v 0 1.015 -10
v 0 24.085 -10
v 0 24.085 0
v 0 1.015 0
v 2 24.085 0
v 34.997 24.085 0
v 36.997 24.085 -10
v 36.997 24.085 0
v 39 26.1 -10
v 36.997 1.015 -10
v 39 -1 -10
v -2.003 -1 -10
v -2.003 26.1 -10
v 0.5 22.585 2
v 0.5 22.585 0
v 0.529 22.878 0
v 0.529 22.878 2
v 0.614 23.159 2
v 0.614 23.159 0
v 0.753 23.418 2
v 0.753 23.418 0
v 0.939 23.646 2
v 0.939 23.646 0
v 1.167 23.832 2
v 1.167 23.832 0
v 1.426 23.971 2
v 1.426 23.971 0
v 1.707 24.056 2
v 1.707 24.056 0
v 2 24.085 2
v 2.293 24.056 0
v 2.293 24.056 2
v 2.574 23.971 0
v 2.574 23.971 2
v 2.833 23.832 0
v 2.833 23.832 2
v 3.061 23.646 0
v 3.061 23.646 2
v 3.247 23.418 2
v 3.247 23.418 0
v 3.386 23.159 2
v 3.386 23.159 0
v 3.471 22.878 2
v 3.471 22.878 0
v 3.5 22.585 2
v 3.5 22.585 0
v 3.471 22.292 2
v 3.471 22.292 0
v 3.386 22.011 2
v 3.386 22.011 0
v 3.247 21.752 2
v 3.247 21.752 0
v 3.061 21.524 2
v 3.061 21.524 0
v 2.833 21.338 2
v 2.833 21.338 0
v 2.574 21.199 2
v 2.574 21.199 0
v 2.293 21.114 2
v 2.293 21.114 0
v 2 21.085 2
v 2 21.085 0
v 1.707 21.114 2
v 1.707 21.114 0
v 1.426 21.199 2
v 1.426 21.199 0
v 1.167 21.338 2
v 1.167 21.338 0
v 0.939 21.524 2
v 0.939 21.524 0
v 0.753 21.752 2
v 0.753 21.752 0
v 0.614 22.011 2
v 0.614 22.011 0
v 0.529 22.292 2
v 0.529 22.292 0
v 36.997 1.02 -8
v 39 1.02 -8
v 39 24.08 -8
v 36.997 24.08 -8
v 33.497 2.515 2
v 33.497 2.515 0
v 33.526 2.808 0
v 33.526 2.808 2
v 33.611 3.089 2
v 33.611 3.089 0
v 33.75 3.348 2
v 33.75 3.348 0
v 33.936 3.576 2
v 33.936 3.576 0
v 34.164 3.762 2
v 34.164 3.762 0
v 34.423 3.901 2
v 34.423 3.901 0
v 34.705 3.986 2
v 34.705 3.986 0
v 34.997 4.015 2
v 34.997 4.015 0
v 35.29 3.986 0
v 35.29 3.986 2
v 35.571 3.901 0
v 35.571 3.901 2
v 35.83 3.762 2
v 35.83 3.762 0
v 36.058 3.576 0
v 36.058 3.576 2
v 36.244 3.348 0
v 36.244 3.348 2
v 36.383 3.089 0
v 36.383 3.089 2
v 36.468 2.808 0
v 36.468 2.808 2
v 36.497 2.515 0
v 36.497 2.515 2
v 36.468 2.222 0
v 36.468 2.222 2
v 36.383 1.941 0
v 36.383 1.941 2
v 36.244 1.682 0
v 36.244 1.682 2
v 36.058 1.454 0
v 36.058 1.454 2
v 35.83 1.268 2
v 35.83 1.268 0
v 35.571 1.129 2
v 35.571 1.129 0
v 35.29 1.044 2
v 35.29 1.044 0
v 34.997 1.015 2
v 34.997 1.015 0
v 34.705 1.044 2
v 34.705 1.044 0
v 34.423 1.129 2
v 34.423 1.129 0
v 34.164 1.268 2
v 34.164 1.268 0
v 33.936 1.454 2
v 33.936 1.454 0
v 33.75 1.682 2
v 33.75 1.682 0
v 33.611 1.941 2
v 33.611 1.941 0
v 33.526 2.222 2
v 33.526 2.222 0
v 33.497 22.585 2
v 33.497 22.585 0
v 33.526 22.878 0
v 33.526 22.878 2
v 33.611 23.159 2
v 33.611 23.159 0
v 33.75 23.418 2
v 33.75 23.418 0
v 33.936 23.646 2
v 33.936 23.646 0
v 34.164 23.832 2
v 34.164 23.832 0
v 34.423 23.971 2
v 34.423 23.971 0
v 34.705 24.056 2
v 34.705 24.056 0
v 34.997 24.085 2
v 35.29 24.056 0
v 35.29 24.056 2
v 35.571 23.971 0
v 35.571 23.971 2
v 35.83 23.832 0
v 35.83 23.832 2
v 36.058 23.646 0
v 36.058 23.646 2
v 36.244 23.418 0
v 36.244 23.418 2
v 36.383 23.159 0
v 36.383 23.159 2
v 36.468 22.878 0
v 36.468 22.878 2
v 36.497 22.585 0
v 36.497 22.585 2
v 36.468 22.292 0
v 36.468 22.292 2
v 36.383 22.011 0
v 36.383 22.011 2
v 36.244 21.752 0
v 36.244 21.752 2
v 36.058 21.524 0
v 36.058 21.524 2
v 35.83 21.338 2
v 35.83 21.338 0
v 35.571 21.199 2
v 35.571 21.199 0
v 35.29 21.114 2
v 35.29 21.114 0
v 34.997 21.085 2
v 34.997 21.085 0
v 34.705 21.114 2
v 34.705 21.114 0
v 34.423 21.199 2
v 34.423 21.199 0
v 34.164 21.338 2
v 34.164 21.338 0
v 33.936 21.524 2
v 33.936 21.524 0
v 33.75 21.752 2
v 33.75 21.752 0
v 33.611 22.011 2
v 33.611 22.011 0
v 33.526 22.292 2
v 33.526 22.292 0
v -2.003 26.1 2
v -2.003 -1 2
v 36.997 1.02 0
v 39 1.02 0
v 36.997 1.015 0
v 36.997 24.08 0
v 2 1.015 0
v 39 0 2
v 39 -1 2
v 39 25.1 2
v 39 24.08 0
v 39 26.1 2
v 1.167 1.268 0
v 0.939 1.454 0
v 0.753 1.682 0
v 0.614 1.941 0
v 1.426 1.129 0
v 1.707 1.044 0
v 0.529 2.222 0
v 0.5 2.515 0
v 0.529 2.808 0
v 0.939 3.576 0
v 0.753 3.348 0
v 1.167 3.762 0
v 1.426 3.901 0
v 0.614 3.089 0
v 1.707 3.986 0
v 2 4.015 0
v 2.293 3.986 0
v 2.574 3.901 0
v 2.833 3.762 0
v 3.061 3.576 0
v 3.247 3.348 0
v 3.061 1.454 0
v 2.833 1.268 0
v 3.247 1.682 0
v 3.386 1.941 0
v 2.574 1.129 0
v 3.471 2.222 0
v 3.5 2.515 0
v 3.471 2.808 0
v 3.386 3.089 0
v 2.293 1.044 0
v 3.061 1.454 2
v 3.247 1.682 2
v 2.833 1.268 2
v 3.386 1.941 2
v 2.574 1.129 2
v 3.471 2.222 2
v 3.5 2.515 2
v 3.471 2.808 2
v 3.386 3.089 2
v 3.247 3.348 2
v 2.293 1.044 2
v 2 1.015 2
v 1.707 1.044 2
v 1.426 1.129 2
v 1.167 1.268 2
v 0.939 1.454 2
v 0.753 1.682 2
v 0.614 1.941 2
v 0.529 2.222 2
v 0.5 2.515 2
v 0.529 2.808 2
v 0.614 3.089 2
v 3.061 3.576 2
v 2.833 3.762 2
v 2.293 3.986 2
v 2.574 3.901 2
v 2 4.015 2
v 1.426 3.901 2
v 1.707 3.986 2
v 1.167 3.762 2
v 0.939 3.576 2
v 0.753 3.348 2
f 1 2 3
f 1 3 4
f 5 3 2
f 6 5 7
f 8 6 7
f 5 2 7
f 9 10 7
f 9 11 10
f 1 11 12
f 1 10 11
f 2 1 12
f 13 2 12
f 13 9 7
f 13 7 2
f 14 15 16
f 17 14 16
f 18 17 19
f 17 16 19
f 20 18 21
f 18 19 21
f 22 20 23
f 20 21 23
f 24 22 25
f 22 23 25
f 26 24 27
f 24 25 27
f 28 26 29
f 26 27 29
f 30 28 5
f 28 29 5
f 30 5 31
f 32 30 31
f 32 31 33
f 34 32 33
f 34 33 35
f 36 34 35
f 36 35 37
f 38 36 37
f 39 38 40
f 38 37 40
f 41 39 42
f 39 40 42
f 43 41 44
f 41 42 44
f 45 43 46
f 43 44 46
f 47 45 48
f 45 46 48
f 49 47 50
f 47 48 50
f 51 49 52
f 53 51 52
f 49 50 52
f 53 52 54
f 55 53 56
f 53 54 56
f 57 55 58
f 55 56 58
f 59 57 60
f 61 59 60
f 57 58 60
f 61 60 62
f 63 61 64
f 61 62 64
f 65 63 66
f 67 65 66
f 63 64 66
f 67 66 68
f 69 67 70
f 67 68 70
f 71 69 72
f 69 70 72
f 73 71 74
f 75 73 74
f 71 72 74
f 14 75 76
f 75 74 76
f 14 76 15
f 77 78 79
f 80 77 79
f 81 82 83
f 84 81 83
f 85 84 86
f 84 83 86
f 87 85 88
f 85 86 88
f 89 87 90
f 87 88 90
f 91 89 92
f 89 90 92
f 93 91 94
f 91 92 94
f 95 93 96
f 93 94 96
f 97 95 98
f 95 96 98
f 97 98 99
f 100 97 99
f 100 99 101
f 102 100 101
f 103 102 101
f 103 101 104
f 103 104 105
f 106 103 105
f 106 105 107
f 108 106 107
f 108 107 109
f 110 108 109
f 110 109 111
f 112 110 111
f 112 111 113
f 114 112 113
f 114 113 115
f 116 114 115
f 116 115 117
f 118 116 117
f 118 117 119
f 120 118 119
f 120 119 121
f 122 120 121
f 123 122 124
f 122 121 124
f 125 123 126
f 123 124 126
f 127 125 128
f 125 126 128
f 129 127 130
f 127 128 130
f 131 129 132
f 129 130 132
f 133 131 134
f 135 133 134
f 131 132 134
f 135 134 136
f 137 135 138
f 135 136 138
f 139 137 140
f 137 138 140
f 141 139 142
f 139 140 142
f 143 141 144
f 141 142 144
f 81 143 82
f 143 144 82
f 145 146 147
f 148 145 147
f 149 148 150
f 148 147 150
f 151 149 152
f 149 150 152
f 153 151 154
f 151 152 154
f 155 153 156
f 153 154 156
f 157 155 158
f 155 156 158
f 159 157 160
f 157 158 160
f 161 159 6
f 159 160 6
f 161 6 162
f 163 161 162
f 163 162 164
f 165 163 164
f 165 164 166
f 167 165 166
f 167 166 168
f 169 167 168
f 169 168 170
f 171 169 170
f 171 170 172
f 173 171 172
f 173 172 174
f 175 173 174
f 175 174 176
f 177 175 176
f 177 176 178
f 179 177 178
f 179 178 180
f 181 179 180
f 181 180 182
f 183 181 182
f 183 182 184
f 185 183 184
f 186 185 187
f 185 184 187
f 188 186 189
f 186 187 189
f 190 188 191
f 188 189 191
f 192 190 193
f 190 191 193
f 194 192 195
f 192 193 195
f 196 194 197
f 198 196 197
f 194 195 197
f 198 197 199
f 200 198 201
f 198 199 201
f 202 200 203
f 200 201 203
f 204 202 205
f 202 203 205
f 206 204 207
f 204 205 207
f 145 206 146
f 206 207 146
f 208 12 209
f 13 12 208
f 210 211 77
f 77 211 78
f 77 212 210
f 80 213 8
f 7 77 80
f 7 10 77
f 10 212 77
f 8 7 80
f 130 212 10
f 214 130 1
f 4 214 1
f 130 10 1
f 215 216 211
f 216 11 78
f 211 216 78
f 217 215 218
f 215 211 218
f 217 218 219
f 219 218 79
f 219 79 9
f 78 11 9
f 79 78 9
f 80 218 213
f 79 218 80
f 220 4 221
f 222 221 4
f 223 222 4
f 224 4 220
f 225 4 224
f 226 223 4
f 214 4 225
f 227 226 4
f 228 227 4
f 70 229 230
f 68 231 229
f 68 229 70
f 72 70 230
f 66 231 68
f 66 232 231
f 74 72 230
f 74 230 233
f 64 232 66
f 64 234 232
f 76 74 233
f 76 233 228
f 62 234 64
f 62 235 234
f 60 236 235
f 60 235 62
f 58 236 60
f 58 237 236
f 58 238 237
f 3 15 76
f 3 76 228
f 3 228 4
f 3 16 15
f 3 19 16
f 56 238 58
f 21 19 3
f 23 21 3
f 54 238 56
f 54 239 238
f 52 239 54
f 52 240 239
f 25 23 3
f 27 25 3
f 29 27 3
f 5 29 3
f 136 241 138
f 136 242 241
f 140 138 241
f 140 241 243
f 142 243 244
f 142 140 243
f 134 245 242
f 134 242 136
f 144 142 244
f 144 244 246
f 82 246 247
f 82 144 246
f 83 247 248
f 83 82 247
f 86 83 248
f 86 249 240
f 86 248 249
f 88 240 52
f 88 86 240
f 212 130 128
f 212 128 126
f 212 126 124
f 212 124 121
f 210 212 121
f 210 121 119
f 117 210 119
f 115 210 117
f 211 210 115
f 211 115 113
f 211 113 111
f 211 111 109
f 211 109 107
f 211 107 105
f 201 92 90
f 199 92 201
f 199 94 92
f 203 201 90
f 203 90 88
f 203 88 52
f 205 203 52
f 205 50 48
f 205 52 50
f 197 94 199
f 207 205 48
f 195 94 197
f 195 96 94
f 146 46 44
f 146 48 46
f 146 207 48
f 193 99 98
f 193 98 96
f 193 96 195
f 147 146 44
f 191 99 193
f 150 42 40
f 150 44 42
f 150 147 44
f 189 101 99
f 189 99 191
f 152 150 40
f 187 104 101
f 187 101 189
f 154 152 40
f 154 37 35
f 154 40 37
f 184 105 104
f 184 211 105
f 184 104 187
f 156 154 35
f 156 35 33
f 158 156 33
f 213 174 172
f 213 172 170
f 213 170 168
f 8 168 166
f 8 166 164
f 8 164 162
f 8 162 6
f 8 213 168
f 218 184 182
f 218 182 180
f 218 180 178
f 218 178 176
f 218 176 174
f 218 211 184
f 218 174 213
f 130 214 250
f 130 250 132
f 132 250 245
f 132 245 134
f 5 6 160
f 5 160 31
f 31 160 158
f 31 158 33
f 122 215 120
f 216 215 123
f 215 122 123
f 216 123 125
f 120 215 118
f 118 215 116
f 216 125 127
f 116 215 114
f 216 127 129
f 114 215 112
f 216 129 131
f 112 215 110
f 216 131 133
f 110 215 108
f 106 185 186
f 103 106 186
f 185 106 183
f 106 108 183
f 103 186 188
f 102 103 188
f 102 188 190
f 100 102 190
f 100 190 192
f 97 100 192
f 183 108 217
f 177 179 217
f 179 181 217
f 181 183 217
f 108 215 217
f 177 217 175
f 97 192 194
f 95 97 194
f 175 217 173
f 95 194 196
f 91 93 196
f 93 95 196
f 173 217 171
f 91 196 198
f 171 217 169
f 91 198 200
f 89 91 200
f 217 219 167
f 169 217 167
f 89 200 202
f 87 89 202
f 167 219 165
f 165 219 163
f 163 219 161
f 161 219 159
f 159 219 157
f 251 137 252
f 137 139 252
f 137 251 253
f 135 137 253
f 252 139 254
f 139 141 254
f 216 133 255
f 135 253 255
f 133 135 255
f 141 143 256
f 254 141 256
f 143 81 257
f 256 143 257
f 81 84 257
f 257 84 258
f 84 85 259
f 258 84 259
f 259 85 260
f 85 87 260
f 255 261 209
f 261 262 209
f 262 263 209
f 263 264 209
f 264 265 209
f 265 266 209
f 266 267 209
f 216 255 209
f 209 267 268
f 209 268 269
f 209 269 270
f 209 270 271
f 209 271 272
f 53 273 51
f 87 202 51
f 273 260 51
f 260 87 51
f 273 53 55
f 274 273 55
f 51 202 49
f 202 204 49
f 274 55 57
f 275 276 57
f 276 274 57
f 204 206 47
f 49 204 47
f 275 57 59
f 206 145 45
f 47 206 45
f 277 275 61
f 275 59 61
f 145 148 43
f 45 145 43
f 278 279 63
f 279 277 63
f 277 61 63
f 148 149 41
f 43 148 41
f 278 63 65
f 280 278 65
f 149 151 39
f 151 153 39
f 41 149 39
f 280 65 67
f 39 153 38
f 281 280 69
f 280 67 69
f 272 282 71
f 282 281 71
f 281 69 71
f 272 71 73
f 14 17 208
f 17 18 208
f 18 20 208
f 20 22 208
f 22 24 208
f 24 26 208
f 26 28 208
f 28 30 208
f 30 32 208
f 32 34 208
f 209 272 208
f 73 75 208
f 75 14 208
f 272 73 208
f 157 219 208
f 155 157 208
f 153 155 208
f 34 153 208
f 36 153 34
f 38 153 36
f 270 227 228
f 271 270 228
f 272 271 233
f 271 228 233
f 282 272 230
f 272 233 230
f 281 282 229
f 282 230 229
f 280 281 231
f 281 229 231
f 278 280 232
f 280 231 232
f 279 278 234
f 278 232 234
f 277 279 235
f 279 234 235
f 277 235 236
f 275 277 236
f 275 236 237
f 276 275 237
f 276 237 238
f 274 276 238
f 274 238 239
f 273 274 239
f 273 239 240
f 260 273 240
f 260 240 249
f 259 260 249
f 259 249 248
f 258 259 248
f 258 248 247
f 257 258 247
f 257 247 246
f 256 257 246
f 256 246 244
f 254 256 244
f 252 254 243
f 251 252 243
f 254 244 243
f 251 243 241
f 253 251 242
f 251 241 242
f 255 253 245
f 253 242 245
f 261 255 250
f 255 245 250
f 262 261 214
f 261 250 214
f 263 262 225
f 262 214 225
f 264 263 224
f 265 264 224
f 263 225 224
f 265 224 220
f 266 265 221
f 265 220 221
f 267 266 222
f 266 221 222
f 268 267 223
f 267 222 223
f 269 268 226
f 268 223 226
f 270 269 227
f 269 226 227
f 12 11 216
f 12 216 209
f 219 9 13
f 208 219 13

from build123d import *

# Parameters (mm, degrees)
ESBO_O1_W                = 35
ESBO_O1_H                = 25.1
RESSALTO_EXTRUS_O1_DEPTH = 2
ESBO_O2_R                = 1.5
CORTE_EXTRUS_O1_DEPTH    = 2
ESBO_O3_W                = 2.002857319
ESBO_O3_H                = 25.1
RESSALTO_EXTRUS_O2_DEPTH = 2
CORTE_EXTRUS_O2_DEPTH    = 2
ESBO_O5_W                = 4
ESBO_O5_H                = 25.1
RESSALTO_EXTRUS_O3_DEPTH = 2
ESBO_O6_W                = 41.002857319
ESBO_O6_H                = 25.1
RESSALTO_EXTRUS_O4_DEPTH = 10
ESBO_O7_W                = 17.37169178
ESBO_O7_H                = 25.1
RESSALTO_EXTRUS_O5_DEPTH = 2
ESBO_O8_R                = 1.5
CORTE_EXTRUS_O3_DEPTH    = 20
RESSALTO_EXTRUS_O6_START = -10
RESSALTO_EXTRUS_O6_DEPTH = 10
ESBO_O10_W               = 2
ESBO_O10_H               = 2
RESSALTO_EXTRUS_O7_DEPTH = 10
ESBO_O11_R               = 1.5
CORTE_EXTRUS_O4_DEPTH    = 15
ESBO_O12_W               = 41.002857319
ESBO_O12_H               = 1
RESSALTO_EXTRUS_O8_DEPTH = 12
CORTE_EXTRUS_O5_DEPTH    = 10
ESBO_O14_W               = 8
ESBO_O14_H               = 23.06
CORTE_EXTRUS_O6_DEPTH    = 10


with BuildPart() as part:
    # Esboço1 → Ressalto-extrusão1 (new body)
    with BuildSketch(Plane.XY):
        with Locations((17.5, 12.55)):
            Rectangle(ESBO_O1_W, ESBO_O1_H)
    extrude(amount=RESSALTO_EXTRUS_O1_DEPTH)

    # Esboço2 → Corte-extrusão1 (cut)
    with BuildSketch(Plane.XY.offset(2)):
        with Locations((2.13, 22.97)):
            Circle(ESBO_O2_R)
        with Locations(Location((2.13, 2.13, 0), (0, 0, 180))):
            Circle(ESBO_O2_R)
    extrude(amount=-CORTE_EXTRUS_O1_DEPTH, mode=Mode.SUBTRACT)

    # Esboço3 → Ressalto-extrusão2 (add)
    with BuildSketch(Plane.XY.offset(2)):
        with Locations((-1.00142866, 12.55)):
            Rectangle(ESBO_O3_W, ESBO_O3_H)
    extrude(amount=-RESSALTO_EXTRUS_O2_DEPTH)

    # Esboço4 → Corte-extrusão2 (cut)
    with BuildSketch(Plane.XY.offset(2)):
        Polygon((1.597142681, 12.55), (1.597142681, 19.05), (14.597142681, 19.05), (14.597142681, 6.05), (1.597142681, 6.05), align=None)
    extrude(amount=-CORTE_EXTRUS_O2_DEPTH, mode=Mode.SUBTRACT)

    # Esboço5 → Ressalto-extrusão3 (add)
    with BuildSketch(Plane.XY.offset(2)):
        with Locations((37, 12.55)):
            Rectangle(ESBO_O5_W, ESBO_O5_H)
    extrude(amount=-RESSALTO_EXTRUS_O3_DEPTH)

    # Esboço6 → Ressalto-extrusão4 (add)
    with BuildSketch(Plane(origin=(0, 0, 0), x_dir=(-1, 0, 0), z_dir=(0, 0, -1))):
        with Locations((-18.49857134, 12.55)):
            Rectangle(ESBO_O6_W, ESBO_O6_H)
        with BuildLine():
            Line((-32.997142681, 22.1), (-4, 22.1))
            ThreePointArc((-4, 22.1), (-2, 20.1), (0, 22.1))
            Line((0, 22.1), (0, 3))
            ThreePointArc((0, 3), (-2, 5), (-4, 3))
            Line((-4, 3), (-32.997142681, 3))
            ThreePointArc((-32.997142681, 3), (-34.997142681, 5), (-36.997142681, 3))
            Line((-36.997142681, 3), (-36.997142681, 22.1))
            ThreePointArc((-36.997142681, 22.1), (-34.997142681, 20.1), (-32.997142681, 22.1))
        make_face(mode=Mode.SUBTRACT)
    extrude(amount=RESSALTO_EXTRUS_O4_DEPTH)

    # Esboço7 → Ressalto-extrusão5 (add)
    with BuildSketch(Plane.XY.offset(2)):
        with Locations((6.682988571, 12.55)):
            Rectangle(ESBO_O7_W, ESBO_O7_H)
    extrude(amount=-RESSALTO_EXTRUS_O5_DEPTH)

    # Esboço8 → Corte-extrusão3 (cut)
    with BuildSketch(Plane(origin=(0, 0, -10), x_dir=(-1, 0, 0), z_dir=(0, 0, -1))):
        with Locations((-2, 22.585)):
            Circle(ESBO_O8_R)
        with Locations((-2, 2.515)):
            Circle(ESBO_O8_R)
    extrude(amount=-CORTE_EXTRUS_O3_DEPTH, mode=Mode.SUBTRACT)

    # Esboço9 → Ressalto-extrusão6 (add)
    with BuildSketch(Plane(origin=(0, 0, -10), x_dir=(-1, 0, 0), z_dir=(0, 0, -1)).offset(RESSALTO_EXTRUS_O6_START)):
        with BuildLine():
            Line((-2, 20.1), (0, 20.1))
            Line((0, 20.1), (0, 22.1))
            ThreePointArc((0, 22.1), (-0.585786438, 20.685786438), (-2, 20.1))
        make_face()
        with BuildLine():
            Line((0, 5), (0, 3))
            ThreePointArc((0, 3), (-0.585786438, 4.414213562), (-2, 5))
            Line((-2, 5), (0, 5))
        make_face()
    extrude(amount=RESSALTO_EXTRUS_O6_DEPTH)

    # Esboço10 → Ressalto-extrusão7 (add)
    with BuildSketch(Plane(origin=(0, 0, -10), x_dir=(-1, 0, 0), z_dir=(0, 0, -1))):
        Polygon((-34.997142681, 20.1), (-36.997142681, 20.1), (-36.997142681, 22.1), align=None)
        with Locations((-35.997142681, 4)):
            Rectangle(ESBO_O10_W, ESBO_O10_H)
    extrude(amount=-RESSALTO_EXTRUS_O7_DEPTH)

    # Esboço11 → Corte-extrusão4 (cut)
    with BuildSketch(Plane(origin=(0, 0, -10), x_dir=(-1, 0, 0), z_dir=(0, 0, -1))):
        with Locations((-34.997142681, 22.585)):
            Circle(ESBO_O11_R)
        with Locations((-34.997142681, 2.515)):
            Circle(ESBO_O11_R)
    extrude(amount=-CORTE_EXTRUS_O4_DEPTH, mode=Mode.SUBTRACT)

    # Esboço12 → Ressalto-extrusão8 (add)
    with BuildSketch(Plane(origin=(0, 0, -10), x_dir=(-1, 0, 0), z_dir=(0, 0, -1))):
        with Locations((-18.49857134, 25.6)):
            Rectangle(ESBO_O12_W, ESBO_O12_H)
        with Locations((-18.49857134, -0.5)):
            Rectangle(ESBO_O12_W, ESBO_O12_H)
    extrude(amount=-RESSALTO_EXTRUS_O8_DEPTH)

    # Esboço13 → Corte-extrusão5 (cut)
    with BuildSketch(Plane(origin=(0, 0, -10), x_dir=(-1, 0, 0), z_dir=(0, 0, -1))):
        Polygon((-2, 24.085), (0, 24.085), (0, 1.015), (-2, 1.015), (-36.997142681, 1.015), (-36.997142681, 24.085), align=None)
    extrude(amount=-CORTE_EXTRUS_O5_DEPTH, mode=Mode.SUBTRACT)

    # Esboço14 → Corte-extrusão6 (cut)
    with BuildSketch(Plane(origin=(39, 0, 0), x_dir=(0, 0, -1), z_dir=(1, 0, 0))):
        with Locations((4, 12.55)):
            Rectangle(ESBO_O14_W, ESBO_O14_H)
    extrude(amount=-CORTE_EXTRUS_O6_DEPTH, mode=Mode.SUBTRACT)


solid = part.part
